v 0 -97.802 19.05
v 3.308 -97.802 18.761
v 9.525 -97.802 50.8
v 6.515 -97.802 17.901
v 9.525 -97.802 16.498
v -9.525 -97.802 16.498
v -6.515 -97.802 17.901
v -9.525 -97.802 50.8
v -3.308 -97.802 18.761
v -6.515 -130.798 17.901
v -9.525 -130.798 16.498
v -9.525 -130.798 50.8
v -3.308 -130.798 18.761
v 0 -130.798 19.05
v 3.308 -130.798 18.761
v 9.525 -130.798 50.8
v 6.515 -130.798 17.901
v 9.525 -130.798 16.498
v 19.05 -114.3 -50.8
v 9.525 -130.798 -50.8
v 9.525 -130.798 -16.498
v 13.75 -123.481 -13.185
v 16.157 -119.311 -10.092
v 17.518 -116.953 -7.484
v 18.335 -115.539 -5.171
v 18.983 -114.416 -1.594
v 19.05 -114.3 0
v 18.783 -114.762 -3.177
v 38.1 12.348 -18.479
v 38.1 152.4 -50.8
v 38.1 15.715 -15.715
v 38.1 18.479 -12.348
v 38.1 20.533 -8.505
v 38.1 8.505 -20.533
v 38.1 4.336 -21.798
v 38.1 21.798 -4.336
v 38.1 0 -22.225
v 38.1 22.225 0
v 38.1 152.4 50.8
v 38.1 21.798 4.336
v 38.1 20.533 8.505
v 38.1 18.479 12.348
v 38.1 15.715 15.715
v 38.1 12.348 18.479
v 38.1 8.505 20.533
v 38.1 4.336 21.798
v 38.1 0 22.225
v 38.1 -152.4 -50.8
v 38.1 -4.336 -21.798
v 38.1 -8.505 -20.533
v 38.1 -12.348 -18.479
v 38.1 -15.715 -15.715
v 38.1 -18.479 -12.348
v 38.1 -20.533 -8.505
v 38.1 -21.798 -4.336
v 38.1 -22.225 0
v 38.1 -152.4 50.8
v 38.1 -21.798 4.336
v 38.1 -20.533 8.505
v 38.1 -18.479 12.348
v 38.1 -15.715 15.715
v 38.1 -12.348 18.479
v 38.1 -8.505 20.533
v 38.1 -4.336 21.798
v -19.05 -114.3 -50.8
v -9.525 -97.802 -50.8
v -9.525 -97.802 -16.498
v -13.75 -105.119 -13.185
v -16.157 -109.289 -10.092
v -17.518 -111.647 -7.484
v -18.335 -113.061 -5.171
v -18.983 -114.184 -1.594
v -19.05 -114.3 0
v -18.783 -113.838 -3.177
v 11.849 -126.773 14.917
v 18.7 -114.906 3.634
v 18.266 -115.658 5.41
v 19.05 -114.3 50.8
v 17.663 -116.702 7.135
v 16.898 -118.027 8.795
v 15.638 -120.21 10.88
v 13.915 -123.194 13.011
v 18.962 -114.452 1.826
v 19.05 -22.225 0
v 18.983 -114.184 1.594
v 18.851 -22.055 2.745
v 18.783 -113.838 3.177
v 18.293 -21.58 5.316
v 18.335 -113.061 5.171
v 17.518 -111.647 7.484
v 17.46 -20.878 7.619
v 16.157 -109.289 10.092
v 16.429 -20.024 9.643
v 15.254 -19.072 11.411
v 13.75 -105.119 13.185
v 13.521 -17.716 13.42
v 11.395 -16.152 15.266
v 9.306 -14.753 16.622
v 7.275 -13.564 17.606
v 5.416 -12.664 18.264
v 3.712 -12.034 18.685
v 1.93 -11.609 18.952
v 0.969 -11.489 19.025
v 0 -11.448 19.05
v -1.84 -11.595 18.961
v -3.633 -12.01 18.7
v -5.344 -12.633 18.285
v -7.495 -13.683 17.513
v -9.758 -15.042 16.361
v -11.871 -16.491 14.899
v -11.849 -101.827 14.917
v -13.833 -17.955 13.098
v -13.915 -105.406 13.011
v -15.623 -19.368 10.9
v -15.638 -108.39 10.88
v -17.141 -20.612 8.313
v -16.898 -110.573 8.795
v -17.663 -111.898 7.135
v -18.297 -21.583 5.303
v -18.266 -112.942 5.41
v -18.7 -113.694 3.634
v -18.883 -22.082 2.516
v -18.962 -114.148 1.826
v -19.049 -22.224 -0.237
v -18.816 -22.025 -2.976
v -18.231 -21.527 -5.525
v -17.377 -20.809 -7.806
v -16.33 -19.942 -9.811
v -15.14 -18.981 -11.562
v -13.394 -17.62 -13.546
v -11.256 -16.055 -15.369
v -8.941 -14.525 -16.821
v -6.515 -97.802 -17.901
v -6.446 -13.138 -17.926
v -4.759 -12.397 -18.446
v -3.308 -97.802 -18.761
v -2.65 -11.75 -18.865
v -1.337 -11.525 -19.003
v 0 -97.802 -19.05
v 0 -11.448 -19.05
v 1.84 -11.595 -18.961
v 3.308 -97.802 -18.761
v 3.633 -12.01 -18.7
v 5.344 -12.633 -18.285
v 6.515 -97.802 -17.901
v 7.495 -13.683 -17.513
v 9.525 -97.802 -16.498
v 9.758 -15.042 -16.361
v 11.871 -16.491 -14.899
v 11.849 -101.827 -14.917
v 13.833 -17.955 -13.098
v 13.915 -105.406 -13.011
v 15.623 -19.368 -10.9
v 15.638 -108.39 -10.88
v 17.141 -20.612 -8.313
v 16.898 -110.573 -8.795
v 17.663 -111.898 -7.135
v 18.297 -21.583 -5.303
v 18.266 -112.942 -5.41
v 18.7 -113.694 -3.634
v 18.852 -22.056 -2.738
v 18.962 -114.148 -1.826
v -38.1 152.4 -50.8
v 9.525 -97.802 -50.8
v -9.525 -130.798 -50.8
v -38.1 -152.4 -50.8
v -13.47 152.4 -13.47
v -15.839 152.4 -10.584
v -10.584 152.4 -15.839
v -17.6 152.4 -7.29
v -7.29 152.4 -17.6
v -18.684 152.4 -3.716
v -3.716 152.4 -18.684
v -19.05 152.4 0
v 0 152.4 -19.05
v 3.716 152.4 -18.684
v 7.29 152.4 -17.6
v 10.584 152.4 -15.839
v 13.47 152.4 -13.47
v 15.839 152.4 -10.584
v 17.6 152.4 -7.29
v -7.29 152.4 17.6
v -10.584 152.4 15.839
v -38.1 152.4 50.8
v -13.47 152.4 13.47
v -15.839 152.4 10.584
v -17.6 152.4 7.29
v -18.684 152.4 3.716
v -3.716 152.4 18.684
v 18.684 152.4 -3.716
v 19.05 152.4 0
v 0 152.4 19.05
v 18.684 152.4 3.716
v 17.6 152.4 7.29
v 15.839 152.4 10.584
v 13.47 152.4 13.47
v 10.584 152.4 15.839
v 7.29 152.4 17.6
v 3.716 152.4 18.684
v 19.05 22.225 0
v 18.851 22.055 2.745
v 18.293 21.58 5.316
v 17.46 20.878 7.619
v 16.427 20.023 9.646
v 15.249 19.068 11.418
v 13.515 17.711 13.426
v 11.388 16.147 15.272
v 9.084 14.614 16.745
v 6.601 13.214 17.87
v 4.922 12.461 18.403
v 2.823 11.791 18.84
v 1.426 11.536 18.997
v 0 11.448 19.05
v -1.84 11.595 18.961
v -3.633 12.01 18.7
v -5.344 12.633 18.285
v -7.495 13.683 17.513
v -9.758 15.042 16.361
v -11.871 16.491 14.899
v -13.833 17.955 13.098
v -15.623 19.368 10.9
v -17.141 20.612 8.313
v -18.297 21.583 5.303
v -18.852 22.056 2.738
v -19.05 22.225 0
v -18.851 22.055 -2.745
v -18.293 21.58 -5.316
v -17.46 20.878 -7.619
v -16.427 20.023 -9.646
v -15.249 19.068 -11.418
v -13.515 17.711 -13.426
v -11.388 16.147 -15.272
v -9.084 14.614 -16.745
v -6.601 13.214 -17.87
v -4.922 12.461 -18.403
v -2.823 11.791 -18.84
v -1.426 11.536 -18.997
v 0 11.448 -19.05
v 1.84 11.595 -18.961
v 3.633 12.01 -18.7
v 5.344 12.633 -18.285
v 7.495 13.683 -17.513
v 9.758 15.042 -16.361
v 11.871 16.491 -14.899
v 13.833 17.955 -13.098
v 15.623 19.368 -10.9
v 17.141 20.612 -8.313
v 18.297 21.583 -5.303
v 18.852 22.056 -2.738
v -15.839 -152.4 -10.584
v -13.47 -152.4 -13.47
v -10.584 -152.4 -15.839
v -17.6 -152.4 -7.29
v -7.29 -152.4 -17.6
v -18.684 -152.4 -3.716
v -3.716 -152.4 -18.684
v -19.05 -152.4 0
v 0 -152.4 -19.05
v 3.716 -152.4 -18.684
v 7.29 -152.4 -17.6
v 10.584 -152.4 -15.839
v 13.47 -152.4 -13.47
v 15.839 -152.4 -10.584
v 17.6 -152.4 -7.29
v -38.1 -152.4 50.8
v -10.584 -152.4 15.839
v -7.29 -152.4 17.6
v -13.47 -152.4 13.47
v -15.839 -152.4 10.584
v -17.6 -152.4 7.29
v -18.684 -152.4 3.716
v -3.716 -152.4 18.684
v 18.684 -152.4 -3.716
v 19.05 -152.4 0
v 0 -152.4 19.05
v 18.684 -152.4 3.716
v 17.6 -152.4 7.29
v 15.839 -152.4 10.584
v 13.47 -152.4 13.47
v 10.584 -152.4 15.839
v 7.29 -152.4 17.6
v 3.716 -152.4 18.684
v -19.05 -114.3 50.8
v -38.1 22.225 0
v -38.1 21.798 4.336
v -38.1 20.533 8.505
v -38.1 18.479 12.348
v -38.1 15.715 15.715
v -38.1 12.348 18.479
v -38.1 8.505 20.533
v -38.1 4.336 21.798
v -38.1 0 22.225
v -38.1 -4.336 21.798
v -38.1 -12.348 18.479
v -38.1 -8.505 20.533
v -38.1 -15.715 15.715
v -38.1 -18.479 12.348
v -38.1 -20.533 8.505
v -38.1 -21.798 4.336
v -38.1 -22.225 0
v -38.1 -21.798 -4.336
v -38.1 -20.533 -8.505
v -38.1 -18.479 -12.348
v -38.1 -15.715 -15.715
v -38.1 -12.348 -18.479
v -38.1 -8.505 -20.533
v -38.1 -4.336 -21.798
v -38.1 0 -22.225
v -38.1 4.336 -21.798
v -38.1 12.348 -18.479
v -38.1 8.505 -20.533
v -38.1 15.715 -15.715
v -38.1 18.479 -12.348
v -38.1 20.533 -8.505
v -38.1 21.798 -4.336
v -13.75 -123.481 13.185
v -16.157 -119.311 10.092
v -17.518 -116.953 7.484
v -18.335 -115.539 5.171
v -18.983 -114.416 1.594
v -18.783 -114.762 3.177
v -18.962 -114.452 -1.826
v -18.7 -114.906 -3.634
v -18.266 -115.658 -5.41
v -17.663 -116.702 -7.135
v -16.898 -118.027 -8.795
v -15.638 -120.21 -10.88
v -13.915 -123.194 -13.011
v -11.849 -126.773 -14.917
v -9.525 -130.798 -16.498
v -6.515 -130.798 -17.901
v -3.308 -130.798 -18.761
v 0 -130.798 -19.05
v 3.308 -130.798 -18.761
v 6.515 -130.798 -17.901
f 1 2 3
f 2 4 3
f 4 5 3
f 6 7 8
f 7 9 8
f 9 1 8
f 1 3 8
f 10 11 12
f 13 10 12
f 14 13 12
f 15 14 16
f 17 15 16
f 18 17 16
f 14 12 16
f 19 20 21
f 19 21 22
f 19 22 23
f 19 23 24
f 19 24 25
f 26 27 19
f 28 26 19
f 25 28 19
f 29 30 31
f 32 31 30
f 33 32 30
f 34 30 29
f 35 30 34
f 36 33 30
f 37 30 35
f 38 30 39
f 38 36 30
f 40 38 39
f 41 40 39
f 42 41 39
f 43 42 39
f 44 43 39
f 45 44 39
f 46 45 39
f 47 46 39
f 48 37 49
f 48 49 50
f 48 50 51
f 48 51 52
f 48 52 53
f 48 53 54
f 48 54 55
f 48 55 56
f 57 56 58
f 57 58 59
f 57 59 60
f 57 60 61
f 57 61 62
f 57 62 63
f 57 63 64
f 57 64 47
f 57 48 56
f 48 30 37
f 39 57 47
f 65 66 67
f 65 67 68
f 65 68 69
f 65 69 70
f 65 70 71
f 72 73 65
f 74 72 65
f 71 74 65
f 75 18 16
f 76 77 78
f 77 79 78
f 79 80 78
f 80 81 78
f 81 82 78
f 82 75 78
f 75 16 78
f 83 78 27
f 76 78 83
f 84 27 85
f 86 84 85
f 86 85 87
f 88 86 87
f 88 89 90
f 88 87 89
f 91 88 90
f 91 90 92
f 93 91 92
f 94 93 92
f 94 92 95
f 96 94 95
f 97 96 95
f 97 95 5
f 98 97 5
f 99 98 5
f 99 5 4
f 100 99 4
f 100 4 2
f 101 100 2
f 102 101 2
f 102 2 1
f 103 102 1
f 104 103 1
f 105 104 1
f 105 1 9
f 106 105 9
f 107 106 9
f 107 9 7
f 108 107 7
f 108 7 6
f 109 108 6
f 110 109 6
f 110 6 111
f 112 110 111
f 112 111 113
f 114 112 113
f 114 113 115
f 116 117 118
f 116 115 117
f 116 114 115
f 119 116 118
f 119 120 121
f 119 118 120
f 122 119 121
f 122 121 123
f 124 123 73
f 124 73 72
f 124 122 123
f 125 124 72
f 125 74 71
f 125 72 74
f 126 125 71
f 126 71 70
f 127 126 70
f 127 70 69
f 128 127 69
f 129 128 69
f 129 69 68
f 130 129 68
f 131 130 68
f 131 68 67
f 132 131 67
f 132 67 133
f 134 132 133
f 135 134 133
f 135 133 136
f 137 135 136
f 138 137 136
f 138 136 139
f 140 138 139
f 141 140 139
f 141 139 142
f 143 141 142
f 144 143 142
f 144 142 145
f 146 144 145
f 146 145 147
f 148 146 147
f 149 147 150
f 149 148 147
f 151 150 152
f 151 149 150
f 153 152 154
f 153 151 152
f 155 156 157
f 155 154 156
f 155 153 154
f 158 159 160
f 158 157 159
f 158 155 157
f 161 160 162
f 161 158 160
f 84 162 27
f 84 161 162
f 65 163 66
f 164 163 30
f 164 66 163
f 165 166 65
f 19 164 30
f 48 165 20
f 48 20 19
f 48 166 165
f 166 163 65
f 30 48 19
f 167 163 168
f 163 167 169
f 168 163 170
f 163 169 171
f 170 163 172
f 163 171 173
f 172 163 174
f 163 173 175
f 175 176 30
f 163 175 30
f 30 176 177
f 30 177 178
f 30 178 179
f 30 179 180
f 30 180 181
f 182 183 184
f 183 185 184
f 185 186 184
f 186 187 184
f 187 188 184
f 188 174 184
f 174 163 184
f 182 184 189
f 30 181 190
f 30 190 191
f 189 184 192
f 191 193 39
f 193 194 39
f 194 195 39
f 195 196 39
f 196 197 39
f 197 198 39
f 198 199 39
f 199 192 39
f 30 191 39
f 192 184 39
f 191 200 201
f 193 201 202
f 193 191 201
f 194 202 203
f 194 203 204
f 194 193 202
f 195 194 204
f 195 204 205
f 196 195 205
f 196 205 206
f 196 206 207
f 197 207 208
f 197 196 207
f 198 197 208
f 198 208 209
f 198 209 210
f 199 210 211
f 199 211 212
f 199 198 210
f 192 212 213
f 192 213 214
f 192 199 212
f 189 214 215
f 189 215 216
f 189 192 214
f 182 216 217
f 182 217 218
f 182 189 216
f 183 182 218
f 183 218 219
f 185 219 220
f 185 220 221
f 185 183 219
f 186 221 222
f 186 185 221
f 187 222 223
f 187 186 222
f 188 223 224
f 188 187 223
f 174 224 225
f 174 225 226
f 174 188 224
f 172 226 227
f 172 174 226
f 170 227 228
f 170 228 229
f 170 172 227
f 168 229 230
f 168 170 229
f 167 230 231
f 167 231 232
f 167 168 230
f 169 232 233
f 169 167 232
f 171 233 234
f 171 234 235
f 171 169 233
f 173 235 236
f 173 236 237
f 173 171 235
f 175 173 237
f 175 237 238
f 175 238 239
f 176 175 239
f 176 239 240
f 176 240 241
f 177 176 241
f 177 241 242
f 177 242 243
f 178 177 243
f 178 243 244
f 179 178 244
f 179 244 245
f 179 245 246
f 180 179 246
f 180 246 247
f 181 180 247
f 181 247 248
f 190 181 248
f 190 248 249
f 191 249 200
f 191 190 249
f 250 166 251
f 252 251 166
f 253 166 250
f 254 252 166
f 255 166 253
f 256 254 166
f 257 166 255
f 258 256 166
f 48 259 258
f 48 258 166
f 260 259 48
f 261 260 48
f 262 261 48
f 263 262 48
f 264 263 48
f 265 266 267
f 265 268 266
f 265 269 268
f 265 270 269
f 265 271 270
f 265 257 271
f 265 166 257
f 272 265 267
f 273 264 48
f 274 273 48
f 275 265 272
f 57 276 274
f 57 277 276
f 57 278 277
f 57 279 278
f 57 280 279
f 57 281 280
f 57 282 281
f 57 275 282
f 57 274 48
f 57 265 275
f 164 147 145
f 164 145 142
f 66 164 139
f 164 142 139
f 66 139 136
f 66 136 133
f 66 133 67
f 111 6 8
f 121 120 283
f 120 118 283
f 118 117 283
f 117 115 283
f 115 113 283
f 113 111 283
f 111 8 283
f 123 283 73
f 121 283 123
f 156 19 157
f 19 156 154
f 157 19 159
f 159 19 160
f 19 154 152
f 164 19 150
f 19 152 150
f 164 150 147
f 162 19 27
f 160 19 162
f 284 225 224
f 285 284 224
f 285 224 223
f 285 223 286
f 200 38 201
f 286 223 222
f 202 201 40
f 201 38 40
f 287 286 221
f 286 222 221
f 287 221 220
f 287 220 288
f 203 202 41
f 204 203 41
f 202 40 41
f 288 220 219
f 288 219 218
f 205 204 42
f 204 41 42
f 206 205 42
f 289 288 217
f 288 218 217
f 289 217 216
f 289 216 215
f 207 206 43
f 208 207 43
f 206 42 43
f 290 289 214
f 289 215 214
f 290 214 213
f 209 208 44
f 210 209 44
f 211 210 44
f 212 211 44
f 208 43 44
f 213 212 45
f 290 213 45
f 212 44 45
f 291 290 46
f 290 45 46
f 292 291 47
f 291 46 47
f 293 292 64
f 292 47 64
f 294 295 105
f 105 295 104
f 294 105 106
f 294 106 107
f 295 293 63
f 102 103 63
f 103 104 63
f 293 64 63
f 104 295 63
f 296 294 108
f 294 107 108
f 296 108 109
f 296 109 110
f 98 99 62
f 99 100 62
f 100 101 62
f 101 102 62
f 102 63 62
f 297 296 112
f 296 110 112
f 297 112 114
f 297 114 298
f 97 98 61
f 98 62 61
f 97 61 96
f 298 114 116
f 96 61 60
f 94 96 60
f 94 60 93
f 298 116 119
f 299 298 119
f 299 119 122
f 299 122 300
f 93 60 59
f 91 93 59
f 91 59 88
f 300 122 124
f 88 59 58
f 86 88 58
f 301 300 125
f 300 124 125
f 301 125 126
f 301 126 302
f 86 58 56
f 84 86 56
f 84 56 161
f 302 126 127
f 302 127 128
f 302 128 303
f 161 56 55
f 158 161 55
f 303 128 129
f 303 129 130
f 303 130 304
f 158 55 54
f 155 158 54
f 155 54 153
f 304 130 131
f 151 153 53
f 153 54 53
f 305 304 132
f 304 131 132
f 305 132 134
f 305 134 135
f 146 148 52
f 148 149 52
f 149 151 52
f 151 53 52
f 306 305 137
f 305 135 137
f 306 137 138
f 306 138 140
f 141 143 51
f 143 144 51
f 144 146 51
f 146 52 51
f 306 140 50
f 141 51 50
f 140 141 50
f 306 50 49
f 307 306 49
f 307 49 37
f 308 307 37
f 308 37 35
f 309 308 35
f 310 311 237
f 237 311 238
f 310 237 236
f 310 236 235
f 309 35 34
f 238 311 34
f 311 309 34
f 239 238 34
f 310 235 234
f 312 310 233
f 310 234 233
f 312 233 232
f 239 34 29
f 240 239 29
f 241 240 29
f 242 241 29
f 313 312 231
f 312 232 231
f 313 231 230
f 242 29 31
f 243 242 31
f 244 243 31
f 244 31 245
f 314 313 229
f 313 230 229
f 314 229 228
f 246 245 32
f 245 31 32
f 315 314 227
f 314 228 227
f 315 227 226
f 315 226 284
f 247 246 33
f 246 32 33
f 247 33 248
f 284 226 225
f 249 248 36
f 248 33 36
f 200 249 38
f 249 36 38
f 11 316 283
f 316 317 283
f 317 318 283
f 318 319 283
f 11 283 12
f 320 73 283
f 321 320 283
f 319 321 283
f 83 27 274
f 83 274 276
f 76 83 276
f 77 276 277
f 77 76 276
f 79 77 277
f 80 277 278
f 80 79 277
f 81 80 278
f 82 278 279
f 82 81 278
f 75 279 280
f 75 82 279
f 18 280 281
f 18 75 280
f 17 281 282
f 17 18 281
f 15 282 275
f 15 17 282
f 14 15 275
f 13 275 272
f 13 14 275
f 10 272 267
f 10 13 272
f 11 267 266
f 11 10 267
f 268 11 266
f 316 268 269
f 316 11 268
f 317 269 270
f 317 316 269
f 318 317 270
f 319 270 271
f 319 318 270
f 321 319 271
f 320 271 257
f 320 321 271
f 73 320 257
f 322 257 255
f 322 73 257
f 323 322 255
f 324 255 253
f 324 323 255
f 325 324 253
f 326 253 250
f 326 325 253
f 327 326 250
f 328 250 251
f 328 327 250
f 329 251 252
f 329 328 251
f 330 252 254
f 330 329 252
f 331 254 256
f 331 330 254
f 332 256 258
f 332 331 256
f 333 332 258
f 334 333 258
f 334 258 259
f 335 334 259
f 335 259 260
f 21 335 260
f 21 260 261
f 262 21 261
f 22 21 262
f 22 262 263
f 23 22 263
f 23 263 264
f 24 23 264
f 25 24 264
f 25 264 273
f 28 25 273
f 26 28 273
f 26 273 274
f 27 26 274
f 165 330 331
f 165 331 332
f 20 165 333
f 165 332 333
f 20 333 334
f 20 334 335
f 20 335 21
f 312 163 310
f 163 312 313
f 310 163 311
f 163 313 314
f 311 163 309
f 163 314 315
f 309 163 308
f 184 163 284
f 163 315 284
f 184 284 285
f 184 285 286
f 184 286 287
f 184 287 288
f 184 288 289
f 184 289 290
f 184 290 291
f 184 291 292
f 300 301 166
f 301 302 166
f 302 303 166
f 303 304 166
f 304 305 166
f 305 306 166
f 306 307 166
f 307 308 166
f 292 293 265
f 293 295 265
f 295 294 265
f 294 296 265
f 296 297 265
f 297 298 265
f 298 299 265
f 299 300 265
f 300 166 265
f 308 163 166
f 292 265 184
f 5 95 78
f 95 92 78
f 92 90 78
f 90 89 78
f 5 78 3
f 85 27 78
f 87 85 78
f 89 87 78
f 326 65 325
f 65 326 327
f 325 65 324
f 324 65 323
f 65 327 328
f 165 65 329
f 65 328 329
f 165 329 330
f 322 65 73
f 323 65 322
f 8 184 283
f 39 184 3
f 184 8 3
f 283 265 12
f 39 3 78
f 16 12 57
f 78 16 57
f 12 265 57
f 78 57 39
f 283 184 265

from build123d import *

# Parameters (mm, degrees)
F0_W          = 76.2
F0_H          = 101.6
F0_R          = 19.05
F1_DEPTH      = 152.4
F2_R          = 22.225
F3_DEPTH      = 38.101
F3_DEPTH_BACK = 139.23277
F5_DEPTH      = 101.601


with BuildPart() as f1:
    # F0 (on Front) → F1 (new body, symmetric)
    with BuildSketch(Plane.XZ):
        Rectangle(F0_W, F0_H)
        Circle(F0_R, mode=Mode.SUBTRACT)
    extrude(amount=F1_DEPTH, both=True)

    # F2 (on Right) → F3 (cut, two sides)
    with BuildSketch(Plane.YZ) as f3_sk:
        Circle(F2_R)
    extrude(amount=F3_DEPTH, mode=Mode.SUBTRACT)
    extrude(f3_sk.sketch, amount=-F3_DEPTH_BACK, mode=Mode.SUBTRACT)

    # F4 (on face) → F5 (cut, through all)
    with BuildSketch(Plane.XY.offset(50.8)):
        Polygon((9.525, -97.802216), (-9.525, -97.802216), (-19.05, -114.3), (-9.525, -130.797784), (9.525, -130.797784), (19.05, -114.3), align=None)
    extrude(amount=-F5_DEPTH, mode=Mode.SUBTRACT)


solid = f1.part
